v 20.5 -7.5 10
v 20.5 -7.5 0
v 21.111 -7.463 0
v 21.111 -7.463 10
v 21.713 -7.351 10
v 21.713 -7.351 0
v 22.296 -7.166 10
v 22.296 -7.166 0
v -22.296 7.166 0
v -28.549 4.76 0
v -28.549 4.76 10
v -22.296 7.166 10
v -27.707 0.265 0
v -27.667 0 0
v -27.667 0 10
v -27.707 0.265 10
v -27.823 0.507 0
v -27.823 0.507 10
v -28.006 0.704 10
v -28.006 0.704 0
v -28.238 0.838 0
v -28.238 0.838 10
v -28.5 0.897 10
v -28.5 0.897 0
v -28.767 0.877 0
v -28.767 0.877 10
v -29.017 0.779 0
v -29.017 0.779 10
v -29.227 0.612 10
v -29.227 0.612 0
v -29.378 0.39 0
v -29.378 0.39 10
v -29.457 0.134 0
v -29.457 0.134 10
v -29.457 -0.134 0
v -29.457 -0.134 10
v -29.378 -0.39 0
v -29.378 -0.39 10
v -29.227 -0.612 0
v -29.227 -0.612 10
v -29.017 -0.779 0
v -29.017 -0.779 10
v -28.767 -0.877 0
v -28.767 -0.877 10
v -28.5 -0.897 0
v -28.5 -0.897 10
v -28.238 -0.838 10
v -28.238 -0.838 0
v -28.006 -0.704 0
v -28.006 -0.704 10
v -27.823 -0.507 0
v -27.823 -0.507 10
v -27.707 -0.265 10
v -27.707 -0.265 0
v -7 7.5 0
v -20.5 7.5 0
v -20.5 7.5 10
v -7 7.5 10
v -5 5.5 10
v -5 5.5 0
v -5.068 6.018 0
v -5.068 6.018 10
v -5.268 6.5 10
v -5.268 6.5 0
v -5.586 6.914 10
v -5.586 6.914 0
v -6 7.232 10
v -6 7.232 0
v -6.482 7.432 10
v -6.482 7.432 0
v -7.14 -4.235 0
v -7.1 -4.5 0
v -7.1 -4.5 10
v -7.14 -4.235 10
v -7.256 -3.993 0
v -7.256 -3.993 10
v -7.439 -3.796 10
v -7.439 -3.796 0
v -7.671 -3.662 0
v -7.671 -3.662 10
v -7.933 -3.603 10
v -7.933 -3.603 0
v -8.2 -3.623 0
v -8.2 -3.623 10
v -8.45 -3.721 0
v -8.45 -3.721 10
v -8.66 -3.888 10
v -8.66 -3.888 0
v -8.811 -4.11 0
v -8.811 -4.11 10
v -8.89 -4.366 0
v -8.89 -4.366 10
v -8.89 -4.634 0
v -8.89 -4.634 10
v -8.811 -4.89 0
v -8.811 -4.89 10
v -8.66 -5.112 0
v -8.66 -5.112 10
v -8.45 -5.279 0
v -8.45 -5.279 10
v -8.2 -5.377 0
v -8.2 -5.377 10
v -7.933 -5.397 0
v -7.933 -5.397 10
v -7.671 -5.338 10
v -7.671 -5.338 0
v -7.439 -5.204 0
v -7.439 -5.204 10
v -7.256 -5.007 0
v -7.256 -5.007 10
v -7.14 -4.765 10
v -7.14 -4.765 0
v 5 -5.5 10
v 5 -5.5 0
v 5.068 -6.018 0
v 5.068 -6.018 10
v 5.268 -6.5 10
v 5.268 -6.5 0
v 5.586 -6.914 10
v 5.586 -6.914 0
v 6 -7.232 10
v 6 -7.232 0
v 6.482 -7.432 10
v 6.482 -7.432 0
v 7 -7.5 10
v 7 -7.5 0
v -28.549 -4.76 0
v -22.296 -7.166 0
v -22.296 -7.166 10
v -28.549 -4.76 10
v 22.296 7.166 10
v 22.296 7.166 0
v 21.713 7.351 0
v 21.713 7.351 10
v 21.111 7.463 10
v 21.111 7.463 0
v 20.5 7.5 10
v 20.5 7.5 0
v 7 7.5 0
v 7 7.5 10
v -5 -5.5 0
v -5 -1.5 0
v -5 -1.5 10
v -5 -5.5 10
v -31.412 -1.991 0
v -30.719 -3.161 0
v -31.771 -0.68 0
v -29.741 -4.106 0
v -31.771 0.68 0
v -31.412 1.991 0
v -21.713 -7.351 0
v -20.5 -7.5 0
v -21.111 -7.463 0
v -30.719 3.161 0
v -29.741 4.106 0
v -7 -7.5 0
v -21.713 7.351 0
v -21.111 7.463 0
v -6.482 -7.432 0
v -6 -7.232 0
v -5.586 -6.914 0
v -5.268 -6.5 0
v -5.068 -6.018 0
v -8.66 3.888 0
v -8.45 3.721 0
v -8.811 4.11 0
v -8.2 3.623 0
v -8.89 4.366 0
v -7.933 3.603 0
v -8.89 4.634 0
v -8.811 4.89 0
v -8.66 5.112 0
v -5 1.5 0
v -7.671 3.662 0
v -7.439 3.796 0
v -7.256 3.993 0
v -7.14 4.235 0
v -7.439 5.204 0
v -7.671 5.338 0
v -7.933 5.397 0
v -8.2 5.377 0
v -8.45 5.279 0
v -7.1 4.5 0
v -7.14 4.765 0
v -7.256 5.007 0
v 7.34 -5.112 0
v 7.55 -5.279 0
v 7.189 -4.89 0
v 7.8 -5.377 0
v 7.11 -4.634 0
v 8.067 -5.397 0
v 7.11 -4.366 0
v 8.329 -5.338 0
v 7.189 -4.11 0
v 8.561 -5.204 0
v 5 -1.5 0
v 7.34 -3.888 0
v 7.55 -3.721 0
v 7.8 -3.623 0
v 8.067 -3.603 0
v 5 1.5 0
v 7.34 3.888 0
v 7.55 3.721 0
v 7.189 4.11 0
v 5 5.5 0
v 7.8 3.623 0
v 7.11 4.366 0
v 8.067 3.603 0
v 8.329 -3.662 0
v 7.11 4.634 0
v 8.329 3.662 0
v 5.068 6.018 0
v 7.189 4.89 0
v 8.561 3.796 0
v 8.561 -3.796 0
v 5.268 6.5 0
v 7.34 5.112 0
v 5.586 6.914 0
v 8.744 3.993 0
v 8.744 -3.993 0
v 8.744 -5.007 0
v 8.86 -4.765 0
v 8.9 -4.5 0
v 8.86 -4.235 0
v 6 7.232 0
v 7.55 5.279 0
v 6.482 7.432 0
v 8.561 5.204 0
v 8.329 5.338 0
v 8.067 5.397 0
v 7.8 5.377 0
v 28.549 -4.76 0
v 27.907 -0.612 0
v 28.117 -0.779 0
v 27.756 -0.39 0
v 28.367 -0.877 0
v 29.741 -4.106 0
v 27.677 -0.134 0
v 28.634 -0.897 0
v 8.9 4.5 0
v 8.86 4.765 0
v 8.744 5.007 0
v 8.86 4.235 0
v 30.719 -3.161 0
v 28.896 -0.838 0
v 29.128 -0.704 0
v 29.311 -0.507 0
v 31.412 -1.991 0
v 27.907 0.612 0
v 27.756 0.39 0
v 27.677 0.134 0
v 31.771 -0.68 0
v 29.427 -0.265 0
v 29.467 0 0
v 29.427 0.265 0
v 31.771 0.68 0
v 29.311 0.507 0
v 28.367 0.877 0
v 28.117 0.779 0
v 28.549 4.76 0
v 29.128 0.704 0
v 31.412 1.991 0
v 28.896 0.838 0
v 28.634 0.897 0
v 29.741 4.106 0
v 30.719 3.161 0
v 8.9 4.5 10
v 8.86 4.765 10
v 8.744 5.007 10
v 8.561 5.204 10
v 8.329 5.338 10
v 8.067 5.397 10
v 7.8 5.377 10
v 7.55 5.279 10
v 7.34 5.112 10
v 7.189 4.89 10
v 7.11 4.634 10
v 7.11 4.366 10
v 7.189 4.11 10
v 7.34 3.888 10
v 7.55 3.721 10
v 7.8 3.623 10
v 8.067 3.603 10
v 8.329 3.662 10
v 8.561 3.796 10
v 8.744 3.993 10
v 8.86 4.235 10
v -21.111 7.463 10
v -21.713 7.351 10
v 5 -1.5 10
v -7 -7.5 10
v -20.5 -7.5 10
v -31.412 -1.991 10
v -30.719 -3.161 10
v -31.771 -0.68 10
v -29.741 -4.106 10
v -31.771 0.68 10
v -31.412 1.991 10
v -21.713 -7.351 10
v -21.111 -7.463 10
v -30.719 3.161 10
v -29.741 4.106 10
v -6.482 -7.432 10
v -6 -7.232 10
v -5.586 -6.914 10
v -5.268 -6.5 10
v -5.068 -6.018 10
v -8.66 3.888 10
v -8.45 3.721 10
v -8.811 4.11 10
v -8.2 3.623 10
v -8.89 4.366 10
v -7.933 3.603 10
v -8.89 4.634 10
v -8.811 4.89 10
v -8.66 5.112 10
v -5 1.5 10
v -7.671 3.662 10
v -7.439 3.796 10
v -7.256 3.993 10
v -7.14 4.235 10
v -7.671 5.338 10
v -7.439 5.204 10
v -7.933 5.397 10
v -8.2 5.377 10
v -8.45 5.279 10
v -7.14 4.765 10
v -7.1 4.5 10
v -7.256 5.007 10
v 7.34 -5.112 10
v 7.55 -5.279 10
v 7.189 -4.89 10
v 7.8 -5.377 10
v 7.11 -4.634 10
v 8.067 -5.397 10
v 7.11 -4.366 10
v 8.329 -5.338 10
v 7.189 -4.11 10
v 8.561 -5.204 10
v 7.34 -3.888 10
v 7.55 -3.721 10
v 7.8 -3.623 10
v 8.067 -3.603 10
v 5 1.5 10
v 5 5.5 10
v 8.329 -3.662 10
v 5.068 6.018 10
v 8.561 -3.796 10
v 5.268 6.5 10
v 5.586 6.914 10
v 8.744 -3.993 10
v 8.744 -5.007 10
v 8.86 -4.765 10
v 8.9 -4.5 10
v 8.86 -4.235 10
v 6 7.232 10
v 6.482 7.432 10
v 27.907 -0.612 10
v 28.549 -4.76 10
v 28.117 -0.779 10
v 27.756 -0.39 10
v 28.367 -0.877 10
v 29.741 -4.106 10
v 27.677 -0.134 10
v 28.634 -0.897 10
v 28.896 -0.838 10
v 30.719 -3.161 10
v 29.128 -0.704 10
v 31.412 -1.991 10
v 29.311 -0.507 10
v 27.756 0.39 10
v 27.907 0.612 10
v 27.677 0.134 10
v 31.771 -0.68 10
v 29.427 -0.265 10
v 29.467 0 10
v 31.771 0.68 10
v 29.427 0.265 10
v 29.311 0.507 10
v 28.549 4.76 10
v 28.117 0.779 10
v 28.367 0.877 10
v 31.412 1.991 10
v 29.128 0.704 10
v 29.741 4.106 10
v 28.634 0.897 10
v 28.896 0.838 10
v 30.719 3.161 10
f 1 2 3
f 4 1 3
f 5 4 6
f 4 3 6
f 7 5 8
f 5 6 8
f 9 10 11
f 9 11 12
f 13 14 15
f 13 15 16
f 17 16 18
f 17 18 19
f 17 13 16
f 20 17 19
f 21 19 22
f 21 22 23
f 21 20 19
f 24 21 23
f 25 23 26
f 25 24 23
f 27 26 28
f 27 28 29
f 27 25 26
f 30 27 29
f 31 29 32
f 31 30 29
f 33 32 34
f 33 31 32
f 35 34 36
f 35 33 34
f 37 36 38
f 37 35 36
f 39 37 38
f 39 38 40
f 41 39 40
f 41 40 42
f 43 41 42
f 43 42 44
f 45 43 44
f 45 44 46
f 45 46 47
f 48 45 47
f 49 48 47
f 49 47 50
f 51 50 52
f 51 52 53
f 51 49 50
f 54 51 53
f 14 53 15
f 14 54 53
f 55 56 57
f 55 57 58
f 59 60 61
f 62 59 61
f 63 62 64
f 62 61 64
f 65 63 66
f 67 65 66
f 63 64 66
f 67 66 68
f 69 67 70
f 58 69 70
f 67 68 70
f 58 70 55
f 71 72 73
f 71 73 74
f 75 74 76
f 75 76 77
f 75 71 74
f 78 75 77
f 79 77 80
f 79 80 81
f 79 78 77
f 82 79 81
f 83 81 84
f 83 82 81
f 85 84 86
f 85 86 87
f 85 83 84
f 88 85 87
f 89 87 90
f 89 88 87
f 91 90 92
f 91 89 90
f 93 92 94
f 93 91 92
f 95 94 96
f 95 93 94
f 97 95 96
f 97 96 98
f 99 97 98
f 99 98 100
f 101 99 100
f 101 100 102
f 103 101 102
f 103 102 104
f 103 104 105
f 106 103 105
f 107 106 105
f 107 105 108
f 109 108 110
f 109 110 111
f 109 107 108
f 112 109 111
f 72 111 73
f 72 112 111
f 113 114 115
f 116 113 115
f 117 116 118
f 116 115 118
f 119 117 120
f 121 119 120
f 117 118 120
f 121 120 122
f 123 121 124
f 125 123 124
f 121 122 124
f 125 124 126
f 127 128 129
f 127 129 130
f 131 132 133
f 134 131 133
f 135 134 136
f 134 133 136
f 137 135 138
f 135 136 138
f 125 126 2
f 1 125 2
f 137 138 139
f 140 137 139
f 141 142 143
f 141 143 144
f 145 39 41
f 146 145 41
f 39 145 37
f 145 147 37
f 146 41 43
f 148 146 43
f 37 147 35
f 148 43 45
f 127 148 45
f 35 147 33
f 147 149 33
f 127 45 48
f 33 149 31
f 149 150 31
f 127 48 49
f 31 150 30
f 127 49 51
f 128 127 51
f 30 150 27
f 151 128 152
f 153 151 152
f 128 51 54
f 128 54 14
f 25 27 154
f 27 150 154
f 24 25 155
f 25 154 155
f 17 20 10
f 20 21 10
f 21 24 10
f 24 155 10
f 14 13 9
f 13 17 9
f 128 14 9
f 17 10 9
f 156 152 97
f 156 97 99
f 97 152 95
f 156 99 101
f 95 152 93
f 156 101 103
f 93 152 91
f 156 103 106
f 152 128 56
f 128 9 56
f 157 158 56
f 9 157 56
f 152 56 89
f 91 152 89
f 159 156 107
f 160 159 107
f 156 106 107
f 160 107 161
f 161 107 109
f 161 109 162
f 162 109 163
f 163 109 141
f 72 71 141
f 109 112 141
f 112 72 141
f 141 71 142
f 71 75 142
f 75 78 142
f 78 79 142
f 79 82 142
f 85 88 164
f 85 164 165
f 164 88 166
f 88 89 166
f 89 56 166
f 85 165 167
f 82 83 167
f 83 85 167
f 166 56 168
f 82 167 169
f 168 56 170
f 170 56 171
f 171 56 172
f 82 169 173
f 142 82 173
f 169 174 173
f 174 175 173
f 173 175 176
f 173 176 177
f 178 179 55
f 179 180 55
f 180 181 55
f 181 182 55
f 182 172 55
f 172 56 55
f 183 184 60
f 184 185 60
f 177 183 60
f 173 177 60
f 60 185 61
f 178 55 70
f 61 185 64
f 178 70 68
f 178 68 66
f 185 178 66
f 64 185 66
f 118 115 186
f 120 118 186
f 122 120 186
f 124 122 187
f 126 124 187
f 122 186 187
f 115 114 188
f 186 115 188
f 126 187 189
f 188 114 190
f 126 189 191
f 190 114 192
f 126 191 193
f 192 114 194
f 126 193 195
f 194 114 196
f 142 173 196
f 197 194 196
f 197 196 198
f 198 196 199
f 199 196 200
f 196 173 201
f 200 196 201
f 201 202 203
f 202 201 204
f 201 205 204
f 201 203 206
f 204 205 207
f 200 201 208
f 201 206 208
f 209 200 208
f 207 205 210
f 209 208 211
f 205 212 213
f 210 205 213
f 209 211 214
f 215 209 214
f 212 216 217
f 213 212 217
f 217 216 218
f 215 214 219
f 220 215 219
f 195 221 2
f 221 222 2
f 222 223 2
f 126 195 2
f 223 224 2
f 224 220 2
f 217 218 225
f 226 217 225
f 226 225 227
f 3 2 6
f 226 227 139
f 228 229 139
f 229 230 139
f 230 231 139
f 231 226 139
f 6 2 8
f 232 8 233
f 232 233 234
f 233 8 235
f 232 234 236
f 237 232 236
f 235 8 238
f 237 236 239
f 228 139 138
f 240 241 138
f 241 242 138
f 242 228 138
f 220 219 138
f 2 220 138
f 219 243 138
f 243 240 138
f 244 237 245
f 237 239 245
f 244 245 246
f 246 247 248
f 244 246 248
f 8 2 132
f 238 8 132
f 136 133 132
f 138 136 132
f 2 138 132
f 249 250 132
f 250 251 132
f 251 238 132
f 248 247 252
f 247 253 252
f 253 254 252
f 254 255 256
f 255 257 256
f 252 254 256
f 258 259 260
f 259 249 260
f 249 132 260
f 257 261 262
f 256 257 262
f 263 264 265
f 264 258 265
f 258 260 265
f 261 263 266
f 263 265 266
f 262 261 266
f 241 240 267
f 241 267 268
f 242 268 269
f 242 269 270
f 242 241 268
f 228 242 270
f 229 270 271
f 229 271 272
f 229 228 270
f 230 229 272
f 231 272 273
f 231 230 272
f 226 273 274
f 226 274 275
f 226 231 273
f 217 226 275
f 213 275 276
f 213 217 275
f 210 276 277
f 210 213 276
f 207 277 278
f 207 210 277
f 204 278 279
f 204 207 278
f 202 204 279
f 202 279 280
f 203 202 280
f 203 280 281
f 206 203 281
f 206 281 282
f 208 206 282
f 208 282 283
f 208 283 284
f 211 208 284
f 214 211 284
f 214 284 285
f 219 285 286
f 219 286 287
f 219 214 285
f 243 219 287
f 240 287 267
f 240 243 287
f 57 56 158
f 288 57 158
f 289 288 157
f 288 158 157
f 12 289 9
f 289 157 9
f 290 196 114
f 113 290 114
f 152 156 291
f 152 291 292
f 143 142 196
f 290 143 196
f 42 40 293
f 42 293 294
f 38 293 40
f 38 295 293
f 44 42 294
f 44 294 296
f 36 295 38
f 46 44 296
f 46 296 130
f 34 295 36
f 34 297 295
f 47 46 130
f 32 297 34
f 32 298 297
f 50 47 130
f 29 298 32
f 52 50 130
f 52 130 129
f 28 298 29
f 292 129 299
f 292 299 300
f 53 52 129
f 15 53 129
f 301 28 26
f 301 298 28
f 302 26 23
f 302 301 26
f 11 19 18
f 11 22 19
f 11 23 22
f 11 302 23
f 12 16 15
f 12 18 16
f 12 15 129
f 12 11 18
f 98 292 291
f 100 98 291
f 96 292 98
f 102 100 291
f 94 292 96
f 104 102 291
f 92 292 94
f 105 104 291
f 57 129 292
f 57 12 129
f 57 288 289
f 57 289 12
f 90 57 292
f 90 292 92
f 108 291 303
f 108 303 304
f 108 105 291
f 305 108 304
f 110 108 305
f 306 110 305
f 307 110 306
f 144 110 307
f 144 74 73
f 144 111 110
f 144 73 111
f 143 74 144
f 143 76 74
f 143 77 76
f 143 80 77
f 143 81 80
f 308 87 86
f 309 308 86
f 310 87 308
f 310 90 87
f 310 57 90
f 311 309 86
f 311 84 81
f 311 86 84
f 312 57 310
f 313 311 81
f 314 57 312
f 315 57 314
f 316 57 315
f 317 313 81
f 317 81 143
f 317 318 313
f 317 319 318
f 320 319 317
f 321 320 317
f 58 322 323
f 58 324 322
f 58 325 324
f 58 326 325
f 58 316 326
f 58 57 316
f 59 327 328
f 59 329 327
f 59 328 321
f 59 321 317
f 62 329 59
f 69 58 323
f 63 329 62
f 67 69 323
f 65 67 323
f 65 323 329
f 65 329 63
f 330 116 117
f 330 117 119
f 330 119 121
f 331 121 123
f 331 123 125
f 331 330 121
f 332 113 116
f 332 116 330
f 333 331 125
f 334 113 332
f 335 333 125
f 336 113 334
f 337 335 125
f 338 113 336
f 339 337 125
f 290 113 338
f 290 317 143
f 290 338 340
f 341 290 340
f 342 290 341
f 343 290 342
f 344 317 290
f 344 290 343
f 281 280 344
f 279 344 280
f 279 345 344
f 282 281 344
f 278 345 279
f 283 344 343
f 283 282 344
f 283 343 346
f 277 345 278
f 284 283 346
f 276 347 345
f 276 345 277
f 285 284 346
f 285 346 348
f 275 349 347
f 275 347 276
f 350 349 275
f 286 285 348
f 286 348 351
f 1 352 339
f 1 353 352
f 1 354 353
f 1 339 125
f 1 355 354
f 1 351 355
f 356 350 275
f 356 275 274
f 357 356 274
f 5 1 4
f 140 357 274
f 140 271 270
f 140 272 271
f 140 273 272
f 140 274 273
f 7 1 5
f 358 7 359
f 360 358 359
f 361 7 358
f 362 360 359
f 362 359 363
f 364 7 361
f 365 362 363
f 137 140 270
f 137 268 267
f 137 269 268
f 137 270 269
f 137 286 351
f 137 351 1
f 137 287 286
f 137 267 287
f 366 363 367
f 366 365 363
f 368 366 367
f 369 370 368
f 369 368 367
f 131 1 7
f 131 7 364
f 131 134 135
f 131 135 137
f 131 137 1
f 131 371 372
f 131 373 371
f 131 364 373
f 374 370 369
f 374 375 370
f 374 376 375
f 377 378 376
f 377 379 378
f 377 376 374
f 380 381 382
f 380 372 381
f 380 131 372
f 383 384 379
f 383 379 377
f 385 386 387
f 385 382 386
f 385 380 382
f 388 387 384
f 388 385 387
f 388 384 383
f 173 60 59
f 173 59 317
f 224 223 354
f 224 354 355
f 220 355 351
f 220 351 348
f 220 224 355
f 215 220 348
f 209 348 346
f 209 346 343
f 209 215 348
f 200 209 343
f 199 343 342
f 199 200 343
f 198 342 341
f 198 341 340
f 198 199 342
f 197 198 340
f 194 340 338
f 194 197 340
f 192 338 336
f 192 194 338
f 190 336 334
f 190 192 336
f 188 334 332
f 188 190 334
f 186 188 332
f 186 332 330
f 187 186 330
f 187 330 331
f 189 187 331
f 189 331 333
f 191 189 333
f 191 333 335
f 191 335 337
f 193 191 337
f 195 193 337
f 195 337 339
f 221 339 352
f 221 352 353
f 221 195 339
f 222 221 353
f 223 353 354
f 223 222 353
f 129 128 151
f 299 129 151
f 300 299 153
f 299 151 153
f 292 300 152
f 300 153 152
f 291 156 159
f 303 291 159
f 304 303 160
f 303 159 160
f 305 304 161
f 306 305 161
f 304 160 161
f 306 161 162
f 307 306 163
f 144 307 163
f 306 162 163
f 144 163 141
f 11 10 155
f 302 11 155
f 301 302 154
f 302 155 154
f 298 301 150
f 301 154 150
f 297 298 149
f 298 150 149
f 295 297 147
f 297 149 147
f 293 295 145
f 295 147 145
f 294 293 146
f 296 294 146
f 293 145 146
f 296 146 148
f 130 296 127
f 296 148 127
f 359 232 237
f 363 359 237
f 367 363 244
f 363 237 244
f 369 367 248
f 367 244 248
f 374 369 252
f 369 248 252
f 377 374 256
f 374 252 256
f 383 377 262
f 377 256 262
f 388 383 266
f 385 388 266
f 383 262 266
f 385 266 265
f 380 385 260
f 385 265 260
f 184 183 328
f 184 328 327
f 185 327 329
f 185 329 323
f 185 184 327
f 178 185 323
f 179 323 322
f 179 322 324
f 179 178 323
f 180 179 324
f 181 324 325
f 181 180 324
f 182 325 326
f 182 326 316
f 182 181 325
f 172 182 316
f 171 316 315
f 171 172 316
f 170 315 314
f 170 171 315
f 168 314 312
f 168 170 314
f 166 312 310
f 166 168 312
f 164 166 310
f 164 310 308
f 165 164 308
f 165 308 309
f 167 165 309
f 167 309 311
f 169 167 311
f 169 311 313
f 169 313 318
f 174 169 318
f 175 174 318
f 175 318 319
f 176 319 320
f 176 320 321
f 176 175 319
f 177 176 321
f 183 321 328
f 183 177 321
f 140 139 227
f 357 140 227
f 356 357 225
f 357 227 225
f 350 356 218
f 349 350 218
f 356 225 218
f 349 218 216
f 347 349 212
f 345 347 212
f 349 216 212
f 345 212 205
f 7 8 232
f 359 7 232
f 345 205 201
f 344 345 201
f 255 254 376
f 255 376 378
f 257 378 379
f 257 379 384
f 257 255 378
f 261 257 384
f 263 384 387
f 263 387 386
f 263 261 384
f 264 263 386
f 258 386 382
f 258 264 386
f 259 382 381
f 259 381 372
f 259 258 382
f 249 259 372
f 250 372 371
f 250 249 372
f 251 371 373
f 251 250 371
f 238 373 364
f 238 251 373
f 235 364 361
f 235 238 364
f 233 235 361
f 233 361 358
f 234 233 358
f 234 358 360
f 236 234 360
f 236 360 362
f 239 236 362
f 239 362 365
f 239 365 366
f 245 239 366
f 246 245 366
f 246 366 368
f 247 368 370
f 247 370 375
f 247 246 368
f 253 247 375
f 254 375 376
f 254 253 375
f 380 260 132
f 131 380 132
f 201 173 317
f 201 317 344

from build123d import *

# Parameters (mm, degrees)
SKETCH_R  = 0.9
PAD_DEPTH = 10


with BuildPart() as part:
    # Sketch (on XY_Plane of Origin) → Pad (new body)
    with BuildSketch(Plane.XY):
        with BuildLine():
            ThreePointArc((5, -5.5), (5.585786, -6.914214), (7, -7.5))
            Line((7, -7.5), (20.5, -7.5))
            ThreePointArc((20.5, -7.5), (21.413382, -7.415865), (22.296025, -7.166293))
            Line((22.296025, -7.166293), (28.548858, -4.759619))
            ThreePointArc((28.548858, -4.759619), (31.816912, 0), (28.548858, 4.759619))
            Line((28.548858, 4.759619), (22.296025, 7.166293))
            ThreePointArc((22.296025, 7.166293), (21.413382, 7.415865), (20.5, 7.5))
            Line((20.5, 7.5), (7, 7.5))
            ThreePointArc((7, 7.5), (5.585786, 6.914214), (5, 5.5))
            Line((5, 5.5), (5, 1.5))
            Line((-5, 1.5), (5, 1.5))
            Line((-5, 5.5), (-5, 1.5))
            ThreePointArc((-5, 5.5), (-5.585786, 6.914214), (-7, 7.5))
            Line((-20.5, 7.5), (-7, 7.5))
            ThreePointArc((-20.5, 7.5), (-21.413382, 7.415865), (-22.296025, 7.166293))
            Line((-28.548858, 4.759619), (-22.296025, 7.166293))
            ThreePointArc((-28.548858, 4.759619), (-31.816912, 0), (-28.548858, -4.759619))
            Line((-22.296025, -7.166293), (-28.548858, -4.759619))
            ThreePointArc((-22.296025, -7.166293), (-21.413382, -7.415865), (-20.5, -7.5))
            Line((-7, -7.5), (-20.5, -7.5))
            ThreePointArc((-7, -7.5), (-5.585786, -6.914214), (-5, -5.5))
            Line((-5, -1.5), (-5, -5.5))
            Line((-5, -1.5), (5, -1.5))
            Line((5, -1.5), (5, -5.5))
        make_face()
        with Locations((8, 4.5)):
            Circle(SKETCH_R, mode=Mode.SUBTRACT)
        with Locations((8, -4.5)):
            Circle(SKETCH_R, mode=Mode.SUBTRACT)
        with Locations((28.566912, 0)):
            Circle(SKETCH_R, mode=Mode.SUBTRACT)
        with Locations((-8, 4.5)):
            Circle(SKETCH_R, mode=Mode.SUBTRACT)
        with Locations((-8, -4.5)):
            Circle(SKETCH_R, mode=Mode.SUBTRACT)
        with Locations((-28.566912, 0)):
            Circle(SKETCH_R, mode=Mode.SUBTRACT)
    extrude(amount=PAD_DEPTH)


solid = part.part
